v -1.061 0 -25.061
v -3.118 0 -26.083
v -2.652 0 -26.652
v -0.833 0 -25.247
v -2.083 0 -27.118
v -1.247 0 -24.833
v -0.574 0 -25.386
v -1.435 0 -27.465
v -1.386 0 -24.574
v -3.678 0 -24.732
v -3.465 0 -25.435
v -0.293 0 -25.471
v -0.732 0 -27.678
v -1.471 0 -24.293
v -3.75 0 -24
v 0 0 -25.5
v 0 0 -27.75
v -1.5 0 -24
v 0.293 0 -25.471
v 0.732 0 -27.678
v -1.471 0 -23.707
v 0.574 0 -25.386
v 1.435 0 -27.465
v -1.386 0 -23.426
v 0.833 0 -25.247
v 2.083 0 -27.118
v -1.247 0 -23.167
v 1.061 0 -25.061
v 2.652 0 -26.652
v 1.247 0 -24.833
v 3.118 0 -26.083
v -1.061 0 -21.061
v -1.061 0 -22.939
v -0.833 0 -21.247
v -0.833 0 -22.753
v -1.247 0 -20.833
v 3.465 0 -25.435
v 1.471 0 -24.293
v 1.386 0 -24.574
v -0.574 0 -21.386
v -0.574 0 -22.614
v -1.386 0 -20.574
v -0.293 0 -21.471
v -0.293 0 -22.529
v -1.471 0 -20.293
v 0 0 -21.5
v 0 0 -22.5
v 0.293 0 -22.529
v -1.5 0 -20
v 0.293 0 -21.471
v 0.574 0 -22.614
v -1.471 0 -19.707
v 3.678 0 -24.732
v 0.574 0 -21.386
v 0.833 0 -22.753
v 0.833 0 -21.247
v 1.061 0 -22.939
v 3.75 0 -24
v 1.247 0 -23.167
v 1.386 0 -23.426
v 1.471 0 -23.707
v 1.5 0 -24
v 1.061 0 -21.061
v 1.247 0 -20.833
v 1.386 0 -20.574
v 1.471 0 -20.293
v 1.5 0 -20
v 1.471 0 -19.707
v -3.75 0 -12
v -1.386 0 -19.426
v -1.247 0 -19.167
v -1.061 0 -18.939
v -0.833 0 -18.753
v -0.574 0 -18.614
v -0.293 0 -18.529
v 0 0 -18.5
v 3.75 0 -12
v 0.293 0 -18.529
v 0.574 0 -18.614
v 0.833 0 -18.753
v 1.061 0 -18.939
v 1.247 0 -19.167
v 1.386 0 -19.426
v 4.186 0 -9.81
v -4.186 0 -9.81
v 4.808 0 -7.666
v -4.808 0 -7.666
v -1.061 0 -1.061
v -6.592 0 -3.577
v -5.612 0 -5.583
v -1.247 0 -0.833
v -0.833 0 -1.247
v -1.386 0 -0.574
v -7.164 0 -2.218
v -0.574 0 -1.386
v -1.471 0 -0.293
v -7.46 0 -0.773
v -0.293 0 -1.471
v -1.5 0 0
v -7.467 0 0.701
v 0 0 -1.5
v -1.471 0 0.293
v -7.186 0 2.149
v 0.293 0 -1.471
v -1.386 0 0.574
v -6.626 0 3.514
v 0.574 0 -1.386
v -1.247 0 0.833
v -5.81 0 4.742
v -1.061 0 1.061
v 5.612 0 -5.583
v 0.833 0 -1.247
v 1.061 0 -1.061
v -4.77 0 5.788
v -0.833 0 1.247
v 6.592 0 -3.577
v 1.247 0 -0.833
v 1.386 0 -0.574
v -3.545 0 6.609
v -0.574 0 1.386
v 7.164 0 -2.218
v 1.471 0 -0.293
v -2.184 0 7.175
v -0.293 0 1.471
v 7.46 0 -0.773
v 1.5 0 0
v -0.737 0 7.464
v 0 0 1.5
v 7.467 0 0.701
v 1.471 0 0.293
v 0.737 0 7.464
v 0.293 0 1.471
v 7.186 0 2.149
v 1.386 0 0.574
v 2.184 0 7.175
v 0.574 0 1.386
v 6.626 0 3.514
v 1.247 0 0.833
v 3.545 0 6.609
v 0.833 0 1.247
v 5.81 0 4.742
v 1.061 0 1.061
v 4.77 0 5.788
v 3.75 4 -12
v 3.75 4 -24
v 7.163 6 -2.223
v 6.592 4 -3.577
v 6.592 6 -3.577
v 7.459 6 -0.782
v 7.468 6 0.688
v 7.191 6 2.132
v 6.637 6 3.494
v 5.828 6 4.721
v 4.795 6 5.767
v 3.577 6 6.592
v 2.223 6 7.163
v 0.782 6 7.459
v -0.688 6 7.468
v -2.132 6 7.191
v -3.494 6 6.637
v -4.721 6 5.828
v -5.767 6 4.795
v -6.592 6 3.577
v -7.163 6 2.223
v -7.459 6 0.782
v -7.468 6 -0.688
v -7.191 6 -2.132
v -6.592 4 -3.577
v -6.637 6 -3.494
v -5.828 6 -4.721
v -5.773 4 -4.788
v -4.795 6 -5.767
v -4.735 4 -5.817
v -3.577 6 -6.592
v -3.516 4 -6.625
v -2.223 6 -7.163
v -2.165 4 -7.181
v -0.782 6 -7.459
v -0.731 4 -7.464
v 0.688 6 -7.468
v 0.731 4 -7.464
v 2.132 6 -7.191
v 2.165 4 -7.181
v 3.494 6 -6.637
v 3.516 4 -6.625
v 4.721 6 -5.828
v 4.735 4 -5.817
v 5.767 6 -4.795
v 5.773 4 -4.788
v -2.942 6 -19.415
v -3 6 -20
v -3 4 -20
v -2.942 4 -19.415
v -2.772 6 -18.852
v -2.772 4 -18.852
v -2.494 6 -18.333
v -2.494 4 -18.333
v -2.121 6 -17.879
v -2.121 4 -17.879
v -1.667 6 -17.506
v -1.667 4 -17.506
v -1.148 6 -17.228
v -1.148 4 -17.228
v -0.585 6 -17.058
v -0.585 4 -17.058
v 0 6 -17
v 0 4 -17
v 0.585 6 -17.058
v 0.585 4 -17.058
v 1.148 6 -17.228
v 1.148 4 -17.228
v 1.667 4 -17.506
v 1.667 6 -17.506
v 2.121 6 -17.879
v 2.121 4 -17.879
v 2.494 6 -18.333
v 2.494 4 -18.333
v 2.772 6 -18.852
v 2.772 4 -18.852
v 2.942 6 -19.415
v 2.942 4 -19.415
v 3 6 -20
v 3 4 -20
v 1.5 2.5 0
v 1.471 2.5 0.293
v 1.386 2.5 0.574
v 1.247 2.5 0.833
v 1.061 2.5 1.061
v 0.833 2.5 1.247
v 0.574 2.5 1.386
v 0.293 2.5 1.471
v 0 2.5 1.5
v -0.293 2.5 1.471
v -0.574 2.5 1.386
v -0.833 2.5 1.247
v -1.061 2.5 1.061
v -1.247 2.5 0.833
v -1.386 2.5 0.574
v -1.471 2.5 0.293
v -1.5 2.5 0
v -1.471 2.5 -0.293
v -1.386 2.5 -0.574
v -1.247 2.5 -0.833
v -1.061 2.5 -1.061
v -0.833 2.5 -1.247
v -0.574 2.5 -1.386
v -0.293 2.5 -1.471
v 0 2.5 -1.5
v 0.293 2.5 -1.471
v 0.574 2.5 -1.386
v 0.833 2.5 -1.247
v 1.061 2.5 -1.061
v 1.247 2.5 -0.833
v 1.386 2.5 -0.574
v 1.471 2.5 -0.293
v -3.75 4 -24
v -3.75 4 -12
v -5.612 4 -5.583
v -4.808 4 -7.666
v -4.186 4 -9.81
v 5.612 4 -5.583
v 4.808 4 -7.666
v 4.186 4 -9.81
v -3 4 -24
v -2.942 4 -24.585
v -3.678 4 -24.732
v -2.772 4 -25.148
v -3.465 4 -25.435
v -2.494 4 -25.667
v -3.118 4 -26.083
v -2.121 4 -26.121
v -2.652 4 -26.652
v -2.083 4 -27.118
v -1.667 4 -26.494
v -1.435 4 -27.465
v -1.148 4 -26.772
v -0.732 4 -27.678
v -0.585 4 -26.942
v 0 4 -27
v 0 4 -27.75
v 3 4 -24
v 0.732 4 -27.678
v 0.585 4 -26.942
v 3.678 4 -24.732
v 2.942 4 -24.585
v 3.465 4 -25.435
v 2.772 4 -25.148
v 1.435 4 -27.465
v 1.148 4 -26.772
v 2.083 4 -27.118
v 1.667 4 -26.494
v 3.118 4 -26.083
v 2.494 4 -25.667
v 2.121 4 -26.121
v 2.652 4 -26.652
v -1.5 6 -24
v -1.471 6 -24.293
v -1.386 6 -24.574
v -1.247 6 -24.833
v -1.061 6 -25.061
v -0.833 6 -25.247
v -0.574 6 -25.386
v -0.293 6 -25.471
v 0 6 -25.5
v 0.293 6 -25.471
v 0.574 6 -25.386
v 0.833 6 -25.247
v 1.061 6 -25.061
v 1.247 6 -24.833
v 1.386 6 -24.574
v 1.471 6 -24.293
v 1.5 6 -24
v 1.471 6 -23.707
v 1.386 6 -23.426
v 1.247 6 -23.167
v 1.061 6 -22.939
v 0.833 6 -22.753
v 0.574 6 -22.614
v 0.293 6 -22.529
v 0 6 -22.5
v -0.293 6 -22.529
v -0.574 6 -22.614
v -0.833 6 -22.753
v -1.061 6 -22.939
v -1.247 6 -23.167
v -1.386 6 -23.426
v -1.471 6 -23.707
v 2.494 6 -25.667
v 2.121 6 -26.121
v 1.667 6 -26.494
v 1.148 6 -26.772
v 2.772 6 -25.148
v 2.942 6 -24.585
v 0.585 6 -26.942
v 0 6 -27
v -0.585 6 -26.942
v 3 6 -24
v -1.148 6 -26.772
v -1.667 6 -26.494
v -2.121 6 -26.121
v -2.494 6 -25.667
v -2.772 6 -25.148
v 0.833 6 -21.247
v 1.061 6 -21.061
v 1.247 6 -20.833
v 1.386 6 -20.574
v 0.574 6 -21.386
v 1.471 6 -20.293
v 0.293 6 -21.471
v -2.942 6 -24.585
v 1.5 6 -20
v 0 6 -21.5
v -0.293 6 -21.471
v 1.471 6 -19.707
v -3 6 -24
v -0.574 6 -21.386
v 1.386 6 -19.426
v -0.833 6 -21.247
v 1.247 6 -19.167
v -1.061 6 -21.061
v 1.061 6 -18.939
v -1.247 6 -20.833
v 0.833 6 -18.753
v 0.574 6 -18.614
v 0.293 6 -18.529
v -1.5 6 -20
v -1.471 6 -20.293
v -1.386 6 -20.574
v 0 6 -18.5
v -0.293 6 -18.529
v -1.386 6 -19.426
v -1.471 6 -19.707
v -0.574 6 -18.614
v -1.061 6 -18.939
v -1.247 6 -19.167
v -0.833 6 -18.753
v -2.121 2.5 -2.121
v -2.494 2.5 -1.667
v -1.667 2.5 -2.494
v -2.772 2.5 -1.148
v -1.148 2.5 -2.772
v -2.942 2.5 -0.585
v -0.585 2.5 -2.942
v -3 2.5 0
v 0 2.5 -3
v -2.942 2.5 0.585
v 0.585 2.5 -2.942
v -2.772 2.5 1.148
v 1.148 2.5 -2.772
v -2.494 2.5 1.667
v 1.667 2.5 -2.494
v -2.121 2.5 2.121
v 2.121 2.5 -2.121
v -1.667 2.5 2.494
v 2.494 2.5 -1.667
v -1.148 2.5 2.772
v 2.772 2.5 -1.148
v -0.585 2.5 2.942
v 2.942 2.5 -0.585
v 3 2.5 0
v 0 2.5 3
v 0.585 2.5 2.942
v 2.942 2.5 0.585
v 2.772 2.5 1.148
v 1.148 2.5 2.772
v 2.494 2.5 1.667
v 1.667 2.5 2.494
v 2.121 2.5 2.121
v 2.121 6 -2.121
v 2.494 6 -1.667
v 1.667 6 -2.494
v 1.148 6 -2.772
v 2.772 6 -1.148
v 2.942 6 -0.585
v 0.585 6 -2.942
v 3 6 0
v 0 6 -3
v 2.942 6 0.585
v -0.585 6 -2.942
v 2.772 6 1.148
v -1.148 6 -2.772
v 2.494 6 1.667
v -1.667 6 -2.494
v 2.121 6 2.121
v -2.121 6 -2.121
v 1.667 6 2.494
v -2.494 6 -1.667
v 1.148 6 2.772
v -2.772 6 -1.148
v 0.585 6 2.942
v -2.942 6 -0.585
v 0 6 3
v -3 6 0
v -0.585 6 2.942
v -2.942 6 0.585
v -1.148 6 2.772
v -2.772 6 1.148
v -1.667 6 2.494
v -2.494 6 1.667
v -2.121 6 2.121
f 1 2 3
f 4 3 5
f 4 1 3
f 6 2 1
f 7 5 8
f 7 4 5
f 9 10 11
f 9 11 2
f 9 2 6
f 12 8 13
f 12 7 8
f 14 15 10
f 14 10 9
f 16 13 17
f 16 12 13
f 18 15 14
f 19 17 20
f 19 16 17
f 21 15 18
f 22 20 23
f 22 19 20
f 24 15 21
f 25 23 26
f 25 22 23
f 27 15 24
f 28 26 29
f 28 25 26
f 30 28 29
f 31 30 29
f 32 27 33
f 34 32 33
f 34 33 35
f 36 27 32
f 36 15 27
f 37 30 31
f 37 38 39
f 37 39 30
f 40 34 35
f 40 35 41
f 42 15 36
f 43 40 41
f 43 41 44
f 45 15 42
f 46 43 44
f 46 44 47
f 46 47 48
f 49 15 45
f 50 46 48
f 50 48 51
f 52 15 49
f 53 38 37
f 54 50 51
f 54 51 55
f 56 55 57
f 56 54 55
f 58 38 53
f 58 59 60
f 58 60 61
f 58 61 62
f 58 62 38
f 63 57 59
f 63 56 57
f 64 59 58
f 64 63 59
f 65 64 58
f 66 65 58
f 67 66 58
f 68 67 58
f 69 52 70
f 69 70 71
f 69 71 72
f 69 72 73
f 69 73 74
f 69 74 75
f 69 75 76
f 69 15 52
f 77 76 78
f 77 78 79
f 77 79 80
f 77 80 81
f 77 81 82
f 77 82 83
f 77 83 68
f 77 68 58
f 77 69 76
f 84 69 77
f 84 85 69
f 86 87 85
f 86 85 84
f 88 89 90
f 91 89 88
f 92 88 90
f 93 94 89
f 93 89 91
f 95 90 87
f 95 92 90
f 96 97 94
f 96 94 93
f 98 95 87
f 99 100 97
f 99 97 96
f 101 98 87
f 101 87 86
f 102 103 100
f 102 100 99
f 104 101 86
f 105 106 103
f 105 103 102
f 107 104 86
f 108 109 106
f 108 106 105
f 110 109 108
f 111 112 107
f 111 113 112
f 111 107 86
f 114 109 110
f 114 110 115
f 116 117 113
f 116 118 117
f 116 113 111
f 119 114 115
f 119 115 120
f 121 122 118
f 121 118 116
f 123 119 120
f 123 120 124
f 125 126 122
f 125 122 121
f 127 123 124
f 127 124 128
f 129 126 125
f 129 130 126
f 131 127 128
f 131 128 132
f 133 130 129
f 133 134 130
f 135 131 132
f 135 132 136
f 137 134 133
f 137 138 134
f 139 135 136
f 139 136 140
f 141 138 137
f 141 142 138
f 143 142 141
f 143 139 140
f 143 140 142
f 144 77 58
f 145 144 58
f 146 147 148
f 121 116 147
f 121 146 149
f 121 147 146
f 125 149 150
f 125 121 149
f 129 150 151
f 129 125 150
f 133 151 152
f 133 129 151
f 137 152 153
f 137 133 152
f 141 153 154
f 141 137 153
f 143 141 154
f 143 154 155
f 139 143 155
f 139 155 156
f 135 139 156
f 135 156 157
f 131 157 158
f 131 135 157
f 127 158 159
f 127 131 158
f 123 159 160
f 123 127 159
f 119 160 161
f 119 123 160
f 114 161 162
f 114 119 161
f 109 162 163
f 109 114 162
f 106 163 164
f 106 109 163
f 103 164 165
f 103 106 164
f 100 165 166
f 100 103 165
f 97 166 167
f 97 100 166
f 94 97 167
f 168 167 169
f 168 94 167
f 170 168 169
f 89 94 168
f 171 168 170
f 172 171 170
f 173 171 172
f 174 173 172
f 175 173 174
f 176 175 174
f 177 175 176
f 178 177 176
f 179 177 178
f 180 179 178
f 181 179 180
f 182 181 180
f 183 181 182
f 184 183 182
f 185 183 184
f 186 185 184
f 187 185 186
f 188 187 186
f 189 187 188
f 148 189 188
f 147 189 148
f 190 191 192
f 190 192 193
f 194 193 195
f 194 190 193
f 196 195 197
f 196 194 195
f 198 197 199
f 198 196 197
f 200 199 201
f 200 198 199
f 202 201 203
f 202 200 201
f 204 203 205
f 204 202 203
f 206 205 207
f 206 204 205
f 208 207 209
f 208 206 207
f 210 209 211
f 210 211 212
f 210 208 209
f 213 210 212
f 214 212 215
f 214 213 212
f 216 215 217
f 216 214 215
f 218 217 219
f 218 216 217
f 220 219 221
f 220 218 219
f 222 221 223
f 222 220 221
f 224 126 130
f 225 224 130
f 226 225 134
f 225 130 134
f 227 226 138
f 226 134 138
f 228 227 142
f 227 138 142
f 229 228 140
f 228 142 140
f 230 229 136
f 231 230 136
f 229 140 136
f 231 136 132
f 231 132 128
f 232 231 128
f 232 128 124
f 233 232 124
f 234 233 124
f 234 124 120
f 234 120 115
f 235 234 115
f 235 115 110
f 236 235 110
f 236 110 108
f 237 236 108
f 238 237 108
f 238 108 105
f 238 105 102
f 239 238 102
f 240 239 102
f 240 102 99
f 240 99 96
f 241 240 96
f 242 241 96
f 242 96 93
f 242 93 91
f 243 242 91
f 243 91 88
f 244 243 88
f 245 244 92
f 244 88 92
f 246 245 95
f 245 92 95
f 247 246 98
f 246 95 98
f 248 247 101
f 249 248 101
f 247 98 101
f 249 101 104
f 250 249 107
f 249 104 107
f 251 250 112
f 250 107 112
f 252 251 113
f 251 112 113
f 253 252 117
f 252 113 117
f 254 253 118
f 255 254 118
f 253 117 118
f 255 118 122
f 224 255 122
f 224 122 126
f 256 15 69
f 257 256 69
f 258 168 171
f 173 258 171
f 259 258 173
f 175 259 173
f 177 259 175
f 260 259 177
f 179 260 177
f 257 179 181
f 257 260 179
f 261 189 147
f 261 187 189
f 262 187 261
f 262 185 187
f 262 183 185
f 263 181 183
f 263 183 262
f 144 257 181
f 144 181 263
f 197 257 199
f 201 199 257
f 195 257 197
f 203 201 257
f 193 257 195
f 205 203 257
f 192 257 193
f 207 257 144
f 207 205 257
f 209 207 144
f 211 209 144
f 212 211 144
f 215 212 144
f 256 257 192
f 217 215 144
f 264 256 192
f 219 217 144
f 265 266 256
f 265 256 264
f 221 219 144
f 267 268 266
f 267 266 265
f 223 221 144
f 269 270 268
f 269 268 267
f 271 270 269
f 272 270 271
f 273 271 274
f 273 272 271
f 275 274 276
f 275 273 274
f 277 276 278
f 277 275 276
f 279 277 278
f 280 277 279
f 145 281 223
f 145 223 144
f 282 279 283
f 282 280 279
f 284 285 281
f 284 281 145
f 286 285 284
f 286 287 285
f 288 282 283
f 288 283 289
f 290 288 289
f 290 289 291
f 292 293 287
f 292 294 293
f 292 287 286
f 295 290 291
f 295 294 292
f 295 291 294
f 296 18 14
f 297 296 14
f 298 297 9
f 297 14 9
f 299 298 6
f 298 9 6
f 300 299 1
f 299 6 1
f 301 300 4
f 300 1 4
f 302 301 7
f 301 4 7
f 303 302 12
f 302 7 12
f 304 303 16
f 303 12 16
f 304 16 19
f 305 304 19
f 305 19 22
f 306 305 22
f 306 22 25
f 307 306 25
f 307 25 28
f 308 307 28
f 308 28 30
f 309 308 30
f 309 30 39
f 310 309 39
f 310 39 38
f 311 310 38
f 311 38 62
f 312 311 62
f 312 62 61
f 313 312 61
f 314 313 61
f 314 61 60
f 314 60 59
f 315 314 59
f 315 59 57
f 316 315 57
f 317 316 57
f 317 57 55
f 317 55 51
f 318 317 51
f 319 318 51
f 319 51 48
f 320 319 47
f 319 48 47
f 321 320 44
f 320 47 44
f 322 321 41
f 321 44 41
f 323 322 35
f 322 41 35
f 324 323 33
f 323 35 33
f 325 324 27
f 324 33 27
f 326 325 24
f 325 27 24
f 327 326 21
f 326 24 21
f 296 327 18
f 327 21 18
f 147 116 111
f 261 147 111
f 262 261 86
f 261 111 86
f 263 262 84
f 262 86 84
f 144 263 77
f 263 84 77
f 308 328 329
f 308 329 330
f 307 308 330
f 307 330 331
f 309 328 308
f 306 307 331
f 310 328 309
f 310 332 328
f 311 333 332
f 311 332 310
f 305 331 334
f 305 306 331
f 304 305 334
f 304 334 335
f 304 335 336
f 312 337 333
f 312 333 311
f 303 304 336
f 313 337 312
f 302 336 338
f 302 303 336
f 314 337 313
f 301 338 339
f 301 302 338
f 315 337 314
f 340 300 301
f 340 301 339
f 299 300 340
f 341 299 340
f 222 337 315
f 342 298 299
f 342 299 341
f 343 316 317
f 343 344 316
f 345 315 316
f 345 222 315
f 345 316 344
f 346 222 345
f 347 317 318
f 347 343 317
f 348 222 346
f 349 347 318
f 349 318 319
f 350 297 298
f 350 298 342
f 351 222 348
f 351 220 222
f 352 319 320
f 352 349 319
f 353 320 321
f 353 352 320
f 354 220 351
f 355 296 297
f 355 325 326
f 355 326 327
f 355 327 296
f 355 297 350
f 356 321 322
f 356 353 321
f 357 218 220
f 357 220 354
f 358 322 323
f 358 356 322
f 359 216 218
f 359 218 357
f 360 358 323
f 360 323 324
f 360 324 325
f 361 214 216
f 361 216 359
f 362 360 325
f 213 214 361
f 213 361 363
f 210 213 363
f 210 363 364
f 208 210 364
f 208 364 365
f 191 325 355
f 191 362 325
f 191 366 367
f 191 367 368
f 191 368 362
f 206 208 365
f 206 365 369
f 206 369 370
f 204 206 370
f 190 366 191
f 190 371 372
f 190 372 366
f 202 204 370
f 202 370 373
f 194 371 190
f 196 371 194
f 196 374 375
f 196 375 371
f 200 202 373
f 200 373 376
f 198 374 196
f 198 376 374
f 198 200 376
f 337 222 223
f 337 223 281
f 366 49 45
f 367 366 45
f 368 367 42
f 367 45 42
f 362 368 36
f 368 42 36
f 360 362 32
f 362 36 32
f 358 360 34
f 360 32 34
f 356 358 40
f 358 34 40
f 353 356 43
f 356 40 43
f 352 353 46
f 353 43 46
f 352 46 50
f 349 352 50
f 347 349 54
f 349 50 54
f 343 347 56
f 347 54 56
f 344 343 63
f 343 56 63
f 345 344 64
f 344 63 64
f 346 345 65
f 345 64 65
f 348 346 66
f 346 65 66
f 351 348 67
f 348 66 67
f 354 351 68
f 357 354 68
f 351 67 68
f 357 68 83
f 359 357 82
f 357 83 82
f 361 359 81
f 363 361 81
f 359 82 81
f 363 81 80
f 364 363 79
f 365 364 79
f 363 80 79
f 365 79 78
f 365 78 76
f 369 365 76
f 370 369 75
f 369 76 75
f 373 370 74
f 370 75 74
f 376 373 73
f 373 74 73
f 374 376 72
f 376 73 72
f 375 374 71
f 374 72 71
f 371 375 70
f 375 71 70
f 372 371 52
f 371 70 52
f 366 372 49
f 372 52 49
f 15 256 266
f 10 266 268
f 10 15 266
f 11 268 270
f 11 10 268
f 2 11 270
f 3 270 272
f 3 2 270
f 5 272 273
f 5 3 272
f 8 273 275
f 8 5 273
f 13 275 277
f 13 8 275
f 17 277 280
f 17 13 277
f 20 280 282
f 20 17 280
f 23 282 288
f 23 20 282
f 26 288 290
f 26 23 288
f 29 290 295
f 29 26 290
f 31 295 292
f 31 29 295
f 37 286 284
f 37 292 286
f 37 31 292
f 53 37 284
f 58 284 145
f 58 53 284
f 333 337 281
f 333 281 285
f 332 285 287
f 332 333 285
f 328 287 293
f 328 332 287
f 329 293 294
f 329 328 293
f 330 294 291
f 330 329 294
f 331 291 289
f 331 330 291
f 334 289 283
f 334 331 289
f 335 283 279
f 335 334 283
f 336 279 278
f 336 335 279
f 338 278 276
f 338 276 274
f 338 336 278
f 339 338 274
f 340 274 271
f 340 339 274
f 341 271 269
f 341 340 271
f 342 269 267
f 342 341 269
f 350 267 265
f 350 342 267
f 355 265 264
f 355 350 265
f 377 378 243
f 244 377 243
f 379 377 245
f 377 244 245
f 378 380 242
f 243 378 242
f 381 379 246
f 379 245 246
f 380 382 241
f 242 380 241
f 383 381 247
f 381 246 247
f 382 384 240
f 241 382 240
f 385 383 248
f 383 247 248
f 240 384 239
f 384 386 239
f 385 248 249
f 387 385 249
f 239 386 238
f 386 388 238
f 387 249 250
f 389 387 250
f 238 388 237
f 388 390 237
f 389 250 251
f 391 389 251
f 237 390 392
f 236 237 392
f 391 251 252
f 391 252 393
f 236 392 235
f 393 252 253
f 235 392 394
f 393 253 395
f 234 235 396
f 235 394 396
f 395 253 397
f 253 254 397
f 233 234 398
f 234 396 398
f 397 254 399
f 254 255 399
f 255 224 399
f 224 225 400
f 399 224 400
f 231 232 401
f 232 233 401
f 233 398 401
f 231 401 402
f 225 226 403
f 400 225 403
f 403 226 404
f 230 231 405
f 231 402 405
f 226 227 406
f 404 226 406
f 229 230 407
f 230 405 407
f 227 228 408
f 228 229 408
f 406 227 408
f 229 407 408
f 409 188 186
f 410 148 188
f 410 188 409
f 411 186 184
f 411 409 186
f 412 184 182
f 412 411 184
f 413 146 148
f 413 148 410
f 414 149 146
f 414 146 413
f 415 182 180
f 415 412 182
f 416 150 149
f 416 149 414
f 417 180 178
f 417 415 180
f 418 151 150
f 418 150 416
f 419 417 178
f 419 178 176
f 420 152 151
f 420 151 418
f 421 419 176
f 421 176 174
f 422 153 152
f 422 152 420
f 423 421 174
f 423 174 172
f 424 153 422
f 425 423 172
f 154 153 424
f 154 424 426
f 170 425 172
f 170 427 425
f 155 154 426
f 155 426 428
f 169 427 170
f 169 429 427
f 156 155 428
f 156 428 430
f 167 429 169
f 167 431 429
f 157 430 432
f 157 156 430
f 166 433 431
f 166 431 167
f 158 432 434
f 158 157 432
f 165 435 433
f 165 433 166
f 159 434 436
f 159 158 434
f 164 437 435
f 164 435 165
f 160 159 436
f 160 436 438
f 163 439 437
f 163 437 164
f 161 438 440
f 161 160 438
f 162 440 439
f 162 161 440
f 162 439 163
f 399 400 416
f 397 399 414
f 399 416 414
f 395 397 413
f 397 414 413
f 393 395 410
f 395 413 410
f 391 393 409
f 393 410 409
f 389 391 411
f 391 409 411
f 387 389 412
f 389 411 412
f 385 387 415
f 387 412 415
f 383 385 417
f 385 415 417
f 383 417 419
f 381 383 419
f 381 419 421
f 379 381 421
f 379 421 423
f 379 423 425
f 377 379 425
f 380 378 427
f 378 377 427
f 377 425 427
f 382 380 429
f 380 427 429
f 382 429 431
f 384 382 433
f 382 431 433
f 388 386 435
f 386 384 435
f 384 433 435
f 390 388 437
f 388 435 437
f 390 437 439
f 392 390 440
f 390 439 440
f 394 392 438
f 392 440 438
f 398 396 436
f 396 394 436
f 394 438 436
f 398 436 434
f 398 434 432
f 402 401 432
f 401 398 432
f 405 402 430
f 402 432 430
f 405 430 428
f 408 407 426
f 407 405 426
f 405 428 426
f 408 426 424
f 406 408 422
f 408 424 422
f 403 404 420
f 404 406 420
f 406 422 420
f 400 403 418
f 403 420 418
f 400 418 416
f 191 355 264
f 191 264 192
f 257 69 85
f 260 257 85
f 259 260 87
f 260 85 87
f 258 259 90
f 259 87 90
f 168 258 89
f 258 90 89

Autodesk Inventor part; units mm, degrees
ref_plane "YZ Plane" through (0, 0, 0) normal (1, 0, 0) x (0, 1, 0)
ref_plane "XZ Plane" through (0, 0, 0) normal (0, 1, 0) x (-1, 0, 0)
ref_plane "XY Plane" through (0, 0, 0) normal (0, 0, 1) x (1, 0, 0)
sketch "Sketch1" plane through (0, 0, 0) normal (0, 1, 0) x (-1, 0, 0)
  circle A0 centre (0, 0) radius 7.5
  line L0 (0, 0) -> (0, -24) construction
  line L1 (-3.75, 0) -> (-3.75, -24)
  line L2 (3.75, -24) -> (3.75, 0)
  arc A1 (3.75, 0) -> (-3.75, 0) centre (0, 0) ccw
  arc A2 (-3.75, -24) -> (3.75, -24) centre (0, -24) ccw
  arc A3 (6.5919, -3.5773) -> (3.75, -12) centre (29.4438, -15.9785) ccw
  line L3 (0, -34.8) -> (0, 14.55) projected
  arc A4 (-3.75, -12) -> (-6.5919, -3.5773) centre (-29.4438, -15.9785) ccw
  circle A5 centre (0, -24) radius 1.5
  circle A6 centre (0, -20) radius 1.5
  point P0 (0, -12)
  point P1 (-6.5919, -3.5773)
  point P2 (-3.75, -12)
  dimension "d0" = 15
  dimension "d1" = 24
  dimension "d2" = 7.5
  dimension "d3" = 26
  dimension "d4" = 3
  dimension "d5" = 3
  dimension "d6" = 20
extrude "Extrusion1" add sketch "Sketch1" along normal blind 6 contours A0 L2 A1 L3 | A3 L2 A0 | L2 A2 L3 A5 A6 A0 | A0 L3 A1 L2 | L3 A1 L1 A0 | L3 A6 A5 A2 L1 A0 | A0 L1 A1 L3 | A0 L1 A4
sketch "Sketch2" plane through (0, 6, 0) normal (0, 1, 0) x (1, 0, 0)
  circle A0 centre (0, 0) radius 7.5
  arc A1 (-6.5919, 3.5773) -> (6.5919, 3.5773) centre (0, 0) ccw projected
  circle A2 centre (0, 20) radius 1.5 projected
  circle A3 centre (0, 24) radius 1.5 projected
  circle A4 centre (0, 24) radius 1.5 projected
  line L0 (0, 20) -> (0, 24) construction
  line L1 (3, 20) -> (3, 24)
  line L2 (-3, 24) -> (-3, 20)
  arc A5 (-3, 20) -> (3, 20) centre (0, 20) ccw
  arc A6 (3, 24) -> (-3, 24) centre (0, 24) ccw
  arc A7 (-6.5919, 3.5773) -> (6.5919, 3.5773) centre (0, 0) ccw projected
  arc A8 (3.75, 12) -> (6.5919, 3.5773) centre (29.4438, 15.9785) ccw projected
  line L3 (3.75, 12) -> (3.75, 24) projected
  arc A9 (3.75, 24) -> (-3.75, 24) centre (0, 24) ccw projected
  line L4 (-3.75, 24) -> (-3.75, 12) projected
  arc A10 (-6.5919, 3.5773) -> (-3.75, 12) centre (-29.4438, 15.9785) ccw projected
  circle A11 centre (0, 20) radius 1.5 projected
  circle A12 centre (0, 24) radius 1.5 projected
  point P0 (0, 22)
  point P1 (-6.5919, 3.5773)
  point P2 (6.5919, 3.5773)
  dimension "d9" = 6
extrude "Extrusion2" cut sketch "Sketch2" against normal blind 2 contours A0 A10 L4 A9 L3 A8
sketch "Sketch3" plane through (0, 6, 0) normal (0, 1, 0) x (1, 0, 0)
  circle A0 centre (0, 0) radius 3
  dimension "d12" = 6
extrude "Extrusion3" cut sketch "Sketch3" against normal through all
sketch "Sketch4" plane through (0, 0, 0) normal (0, -1, 0) x (1, 0, 0)
  circle A0 centre (0, 0) radius 1.5
  circle A1 centre (0, 0) radius 3 projected
  dimension "d15" = 3
extrude "Extrusion4" add sketch "Sketch4" against normal blind 2.5
properties part number "ServoArm" material "Stainless Steel"
